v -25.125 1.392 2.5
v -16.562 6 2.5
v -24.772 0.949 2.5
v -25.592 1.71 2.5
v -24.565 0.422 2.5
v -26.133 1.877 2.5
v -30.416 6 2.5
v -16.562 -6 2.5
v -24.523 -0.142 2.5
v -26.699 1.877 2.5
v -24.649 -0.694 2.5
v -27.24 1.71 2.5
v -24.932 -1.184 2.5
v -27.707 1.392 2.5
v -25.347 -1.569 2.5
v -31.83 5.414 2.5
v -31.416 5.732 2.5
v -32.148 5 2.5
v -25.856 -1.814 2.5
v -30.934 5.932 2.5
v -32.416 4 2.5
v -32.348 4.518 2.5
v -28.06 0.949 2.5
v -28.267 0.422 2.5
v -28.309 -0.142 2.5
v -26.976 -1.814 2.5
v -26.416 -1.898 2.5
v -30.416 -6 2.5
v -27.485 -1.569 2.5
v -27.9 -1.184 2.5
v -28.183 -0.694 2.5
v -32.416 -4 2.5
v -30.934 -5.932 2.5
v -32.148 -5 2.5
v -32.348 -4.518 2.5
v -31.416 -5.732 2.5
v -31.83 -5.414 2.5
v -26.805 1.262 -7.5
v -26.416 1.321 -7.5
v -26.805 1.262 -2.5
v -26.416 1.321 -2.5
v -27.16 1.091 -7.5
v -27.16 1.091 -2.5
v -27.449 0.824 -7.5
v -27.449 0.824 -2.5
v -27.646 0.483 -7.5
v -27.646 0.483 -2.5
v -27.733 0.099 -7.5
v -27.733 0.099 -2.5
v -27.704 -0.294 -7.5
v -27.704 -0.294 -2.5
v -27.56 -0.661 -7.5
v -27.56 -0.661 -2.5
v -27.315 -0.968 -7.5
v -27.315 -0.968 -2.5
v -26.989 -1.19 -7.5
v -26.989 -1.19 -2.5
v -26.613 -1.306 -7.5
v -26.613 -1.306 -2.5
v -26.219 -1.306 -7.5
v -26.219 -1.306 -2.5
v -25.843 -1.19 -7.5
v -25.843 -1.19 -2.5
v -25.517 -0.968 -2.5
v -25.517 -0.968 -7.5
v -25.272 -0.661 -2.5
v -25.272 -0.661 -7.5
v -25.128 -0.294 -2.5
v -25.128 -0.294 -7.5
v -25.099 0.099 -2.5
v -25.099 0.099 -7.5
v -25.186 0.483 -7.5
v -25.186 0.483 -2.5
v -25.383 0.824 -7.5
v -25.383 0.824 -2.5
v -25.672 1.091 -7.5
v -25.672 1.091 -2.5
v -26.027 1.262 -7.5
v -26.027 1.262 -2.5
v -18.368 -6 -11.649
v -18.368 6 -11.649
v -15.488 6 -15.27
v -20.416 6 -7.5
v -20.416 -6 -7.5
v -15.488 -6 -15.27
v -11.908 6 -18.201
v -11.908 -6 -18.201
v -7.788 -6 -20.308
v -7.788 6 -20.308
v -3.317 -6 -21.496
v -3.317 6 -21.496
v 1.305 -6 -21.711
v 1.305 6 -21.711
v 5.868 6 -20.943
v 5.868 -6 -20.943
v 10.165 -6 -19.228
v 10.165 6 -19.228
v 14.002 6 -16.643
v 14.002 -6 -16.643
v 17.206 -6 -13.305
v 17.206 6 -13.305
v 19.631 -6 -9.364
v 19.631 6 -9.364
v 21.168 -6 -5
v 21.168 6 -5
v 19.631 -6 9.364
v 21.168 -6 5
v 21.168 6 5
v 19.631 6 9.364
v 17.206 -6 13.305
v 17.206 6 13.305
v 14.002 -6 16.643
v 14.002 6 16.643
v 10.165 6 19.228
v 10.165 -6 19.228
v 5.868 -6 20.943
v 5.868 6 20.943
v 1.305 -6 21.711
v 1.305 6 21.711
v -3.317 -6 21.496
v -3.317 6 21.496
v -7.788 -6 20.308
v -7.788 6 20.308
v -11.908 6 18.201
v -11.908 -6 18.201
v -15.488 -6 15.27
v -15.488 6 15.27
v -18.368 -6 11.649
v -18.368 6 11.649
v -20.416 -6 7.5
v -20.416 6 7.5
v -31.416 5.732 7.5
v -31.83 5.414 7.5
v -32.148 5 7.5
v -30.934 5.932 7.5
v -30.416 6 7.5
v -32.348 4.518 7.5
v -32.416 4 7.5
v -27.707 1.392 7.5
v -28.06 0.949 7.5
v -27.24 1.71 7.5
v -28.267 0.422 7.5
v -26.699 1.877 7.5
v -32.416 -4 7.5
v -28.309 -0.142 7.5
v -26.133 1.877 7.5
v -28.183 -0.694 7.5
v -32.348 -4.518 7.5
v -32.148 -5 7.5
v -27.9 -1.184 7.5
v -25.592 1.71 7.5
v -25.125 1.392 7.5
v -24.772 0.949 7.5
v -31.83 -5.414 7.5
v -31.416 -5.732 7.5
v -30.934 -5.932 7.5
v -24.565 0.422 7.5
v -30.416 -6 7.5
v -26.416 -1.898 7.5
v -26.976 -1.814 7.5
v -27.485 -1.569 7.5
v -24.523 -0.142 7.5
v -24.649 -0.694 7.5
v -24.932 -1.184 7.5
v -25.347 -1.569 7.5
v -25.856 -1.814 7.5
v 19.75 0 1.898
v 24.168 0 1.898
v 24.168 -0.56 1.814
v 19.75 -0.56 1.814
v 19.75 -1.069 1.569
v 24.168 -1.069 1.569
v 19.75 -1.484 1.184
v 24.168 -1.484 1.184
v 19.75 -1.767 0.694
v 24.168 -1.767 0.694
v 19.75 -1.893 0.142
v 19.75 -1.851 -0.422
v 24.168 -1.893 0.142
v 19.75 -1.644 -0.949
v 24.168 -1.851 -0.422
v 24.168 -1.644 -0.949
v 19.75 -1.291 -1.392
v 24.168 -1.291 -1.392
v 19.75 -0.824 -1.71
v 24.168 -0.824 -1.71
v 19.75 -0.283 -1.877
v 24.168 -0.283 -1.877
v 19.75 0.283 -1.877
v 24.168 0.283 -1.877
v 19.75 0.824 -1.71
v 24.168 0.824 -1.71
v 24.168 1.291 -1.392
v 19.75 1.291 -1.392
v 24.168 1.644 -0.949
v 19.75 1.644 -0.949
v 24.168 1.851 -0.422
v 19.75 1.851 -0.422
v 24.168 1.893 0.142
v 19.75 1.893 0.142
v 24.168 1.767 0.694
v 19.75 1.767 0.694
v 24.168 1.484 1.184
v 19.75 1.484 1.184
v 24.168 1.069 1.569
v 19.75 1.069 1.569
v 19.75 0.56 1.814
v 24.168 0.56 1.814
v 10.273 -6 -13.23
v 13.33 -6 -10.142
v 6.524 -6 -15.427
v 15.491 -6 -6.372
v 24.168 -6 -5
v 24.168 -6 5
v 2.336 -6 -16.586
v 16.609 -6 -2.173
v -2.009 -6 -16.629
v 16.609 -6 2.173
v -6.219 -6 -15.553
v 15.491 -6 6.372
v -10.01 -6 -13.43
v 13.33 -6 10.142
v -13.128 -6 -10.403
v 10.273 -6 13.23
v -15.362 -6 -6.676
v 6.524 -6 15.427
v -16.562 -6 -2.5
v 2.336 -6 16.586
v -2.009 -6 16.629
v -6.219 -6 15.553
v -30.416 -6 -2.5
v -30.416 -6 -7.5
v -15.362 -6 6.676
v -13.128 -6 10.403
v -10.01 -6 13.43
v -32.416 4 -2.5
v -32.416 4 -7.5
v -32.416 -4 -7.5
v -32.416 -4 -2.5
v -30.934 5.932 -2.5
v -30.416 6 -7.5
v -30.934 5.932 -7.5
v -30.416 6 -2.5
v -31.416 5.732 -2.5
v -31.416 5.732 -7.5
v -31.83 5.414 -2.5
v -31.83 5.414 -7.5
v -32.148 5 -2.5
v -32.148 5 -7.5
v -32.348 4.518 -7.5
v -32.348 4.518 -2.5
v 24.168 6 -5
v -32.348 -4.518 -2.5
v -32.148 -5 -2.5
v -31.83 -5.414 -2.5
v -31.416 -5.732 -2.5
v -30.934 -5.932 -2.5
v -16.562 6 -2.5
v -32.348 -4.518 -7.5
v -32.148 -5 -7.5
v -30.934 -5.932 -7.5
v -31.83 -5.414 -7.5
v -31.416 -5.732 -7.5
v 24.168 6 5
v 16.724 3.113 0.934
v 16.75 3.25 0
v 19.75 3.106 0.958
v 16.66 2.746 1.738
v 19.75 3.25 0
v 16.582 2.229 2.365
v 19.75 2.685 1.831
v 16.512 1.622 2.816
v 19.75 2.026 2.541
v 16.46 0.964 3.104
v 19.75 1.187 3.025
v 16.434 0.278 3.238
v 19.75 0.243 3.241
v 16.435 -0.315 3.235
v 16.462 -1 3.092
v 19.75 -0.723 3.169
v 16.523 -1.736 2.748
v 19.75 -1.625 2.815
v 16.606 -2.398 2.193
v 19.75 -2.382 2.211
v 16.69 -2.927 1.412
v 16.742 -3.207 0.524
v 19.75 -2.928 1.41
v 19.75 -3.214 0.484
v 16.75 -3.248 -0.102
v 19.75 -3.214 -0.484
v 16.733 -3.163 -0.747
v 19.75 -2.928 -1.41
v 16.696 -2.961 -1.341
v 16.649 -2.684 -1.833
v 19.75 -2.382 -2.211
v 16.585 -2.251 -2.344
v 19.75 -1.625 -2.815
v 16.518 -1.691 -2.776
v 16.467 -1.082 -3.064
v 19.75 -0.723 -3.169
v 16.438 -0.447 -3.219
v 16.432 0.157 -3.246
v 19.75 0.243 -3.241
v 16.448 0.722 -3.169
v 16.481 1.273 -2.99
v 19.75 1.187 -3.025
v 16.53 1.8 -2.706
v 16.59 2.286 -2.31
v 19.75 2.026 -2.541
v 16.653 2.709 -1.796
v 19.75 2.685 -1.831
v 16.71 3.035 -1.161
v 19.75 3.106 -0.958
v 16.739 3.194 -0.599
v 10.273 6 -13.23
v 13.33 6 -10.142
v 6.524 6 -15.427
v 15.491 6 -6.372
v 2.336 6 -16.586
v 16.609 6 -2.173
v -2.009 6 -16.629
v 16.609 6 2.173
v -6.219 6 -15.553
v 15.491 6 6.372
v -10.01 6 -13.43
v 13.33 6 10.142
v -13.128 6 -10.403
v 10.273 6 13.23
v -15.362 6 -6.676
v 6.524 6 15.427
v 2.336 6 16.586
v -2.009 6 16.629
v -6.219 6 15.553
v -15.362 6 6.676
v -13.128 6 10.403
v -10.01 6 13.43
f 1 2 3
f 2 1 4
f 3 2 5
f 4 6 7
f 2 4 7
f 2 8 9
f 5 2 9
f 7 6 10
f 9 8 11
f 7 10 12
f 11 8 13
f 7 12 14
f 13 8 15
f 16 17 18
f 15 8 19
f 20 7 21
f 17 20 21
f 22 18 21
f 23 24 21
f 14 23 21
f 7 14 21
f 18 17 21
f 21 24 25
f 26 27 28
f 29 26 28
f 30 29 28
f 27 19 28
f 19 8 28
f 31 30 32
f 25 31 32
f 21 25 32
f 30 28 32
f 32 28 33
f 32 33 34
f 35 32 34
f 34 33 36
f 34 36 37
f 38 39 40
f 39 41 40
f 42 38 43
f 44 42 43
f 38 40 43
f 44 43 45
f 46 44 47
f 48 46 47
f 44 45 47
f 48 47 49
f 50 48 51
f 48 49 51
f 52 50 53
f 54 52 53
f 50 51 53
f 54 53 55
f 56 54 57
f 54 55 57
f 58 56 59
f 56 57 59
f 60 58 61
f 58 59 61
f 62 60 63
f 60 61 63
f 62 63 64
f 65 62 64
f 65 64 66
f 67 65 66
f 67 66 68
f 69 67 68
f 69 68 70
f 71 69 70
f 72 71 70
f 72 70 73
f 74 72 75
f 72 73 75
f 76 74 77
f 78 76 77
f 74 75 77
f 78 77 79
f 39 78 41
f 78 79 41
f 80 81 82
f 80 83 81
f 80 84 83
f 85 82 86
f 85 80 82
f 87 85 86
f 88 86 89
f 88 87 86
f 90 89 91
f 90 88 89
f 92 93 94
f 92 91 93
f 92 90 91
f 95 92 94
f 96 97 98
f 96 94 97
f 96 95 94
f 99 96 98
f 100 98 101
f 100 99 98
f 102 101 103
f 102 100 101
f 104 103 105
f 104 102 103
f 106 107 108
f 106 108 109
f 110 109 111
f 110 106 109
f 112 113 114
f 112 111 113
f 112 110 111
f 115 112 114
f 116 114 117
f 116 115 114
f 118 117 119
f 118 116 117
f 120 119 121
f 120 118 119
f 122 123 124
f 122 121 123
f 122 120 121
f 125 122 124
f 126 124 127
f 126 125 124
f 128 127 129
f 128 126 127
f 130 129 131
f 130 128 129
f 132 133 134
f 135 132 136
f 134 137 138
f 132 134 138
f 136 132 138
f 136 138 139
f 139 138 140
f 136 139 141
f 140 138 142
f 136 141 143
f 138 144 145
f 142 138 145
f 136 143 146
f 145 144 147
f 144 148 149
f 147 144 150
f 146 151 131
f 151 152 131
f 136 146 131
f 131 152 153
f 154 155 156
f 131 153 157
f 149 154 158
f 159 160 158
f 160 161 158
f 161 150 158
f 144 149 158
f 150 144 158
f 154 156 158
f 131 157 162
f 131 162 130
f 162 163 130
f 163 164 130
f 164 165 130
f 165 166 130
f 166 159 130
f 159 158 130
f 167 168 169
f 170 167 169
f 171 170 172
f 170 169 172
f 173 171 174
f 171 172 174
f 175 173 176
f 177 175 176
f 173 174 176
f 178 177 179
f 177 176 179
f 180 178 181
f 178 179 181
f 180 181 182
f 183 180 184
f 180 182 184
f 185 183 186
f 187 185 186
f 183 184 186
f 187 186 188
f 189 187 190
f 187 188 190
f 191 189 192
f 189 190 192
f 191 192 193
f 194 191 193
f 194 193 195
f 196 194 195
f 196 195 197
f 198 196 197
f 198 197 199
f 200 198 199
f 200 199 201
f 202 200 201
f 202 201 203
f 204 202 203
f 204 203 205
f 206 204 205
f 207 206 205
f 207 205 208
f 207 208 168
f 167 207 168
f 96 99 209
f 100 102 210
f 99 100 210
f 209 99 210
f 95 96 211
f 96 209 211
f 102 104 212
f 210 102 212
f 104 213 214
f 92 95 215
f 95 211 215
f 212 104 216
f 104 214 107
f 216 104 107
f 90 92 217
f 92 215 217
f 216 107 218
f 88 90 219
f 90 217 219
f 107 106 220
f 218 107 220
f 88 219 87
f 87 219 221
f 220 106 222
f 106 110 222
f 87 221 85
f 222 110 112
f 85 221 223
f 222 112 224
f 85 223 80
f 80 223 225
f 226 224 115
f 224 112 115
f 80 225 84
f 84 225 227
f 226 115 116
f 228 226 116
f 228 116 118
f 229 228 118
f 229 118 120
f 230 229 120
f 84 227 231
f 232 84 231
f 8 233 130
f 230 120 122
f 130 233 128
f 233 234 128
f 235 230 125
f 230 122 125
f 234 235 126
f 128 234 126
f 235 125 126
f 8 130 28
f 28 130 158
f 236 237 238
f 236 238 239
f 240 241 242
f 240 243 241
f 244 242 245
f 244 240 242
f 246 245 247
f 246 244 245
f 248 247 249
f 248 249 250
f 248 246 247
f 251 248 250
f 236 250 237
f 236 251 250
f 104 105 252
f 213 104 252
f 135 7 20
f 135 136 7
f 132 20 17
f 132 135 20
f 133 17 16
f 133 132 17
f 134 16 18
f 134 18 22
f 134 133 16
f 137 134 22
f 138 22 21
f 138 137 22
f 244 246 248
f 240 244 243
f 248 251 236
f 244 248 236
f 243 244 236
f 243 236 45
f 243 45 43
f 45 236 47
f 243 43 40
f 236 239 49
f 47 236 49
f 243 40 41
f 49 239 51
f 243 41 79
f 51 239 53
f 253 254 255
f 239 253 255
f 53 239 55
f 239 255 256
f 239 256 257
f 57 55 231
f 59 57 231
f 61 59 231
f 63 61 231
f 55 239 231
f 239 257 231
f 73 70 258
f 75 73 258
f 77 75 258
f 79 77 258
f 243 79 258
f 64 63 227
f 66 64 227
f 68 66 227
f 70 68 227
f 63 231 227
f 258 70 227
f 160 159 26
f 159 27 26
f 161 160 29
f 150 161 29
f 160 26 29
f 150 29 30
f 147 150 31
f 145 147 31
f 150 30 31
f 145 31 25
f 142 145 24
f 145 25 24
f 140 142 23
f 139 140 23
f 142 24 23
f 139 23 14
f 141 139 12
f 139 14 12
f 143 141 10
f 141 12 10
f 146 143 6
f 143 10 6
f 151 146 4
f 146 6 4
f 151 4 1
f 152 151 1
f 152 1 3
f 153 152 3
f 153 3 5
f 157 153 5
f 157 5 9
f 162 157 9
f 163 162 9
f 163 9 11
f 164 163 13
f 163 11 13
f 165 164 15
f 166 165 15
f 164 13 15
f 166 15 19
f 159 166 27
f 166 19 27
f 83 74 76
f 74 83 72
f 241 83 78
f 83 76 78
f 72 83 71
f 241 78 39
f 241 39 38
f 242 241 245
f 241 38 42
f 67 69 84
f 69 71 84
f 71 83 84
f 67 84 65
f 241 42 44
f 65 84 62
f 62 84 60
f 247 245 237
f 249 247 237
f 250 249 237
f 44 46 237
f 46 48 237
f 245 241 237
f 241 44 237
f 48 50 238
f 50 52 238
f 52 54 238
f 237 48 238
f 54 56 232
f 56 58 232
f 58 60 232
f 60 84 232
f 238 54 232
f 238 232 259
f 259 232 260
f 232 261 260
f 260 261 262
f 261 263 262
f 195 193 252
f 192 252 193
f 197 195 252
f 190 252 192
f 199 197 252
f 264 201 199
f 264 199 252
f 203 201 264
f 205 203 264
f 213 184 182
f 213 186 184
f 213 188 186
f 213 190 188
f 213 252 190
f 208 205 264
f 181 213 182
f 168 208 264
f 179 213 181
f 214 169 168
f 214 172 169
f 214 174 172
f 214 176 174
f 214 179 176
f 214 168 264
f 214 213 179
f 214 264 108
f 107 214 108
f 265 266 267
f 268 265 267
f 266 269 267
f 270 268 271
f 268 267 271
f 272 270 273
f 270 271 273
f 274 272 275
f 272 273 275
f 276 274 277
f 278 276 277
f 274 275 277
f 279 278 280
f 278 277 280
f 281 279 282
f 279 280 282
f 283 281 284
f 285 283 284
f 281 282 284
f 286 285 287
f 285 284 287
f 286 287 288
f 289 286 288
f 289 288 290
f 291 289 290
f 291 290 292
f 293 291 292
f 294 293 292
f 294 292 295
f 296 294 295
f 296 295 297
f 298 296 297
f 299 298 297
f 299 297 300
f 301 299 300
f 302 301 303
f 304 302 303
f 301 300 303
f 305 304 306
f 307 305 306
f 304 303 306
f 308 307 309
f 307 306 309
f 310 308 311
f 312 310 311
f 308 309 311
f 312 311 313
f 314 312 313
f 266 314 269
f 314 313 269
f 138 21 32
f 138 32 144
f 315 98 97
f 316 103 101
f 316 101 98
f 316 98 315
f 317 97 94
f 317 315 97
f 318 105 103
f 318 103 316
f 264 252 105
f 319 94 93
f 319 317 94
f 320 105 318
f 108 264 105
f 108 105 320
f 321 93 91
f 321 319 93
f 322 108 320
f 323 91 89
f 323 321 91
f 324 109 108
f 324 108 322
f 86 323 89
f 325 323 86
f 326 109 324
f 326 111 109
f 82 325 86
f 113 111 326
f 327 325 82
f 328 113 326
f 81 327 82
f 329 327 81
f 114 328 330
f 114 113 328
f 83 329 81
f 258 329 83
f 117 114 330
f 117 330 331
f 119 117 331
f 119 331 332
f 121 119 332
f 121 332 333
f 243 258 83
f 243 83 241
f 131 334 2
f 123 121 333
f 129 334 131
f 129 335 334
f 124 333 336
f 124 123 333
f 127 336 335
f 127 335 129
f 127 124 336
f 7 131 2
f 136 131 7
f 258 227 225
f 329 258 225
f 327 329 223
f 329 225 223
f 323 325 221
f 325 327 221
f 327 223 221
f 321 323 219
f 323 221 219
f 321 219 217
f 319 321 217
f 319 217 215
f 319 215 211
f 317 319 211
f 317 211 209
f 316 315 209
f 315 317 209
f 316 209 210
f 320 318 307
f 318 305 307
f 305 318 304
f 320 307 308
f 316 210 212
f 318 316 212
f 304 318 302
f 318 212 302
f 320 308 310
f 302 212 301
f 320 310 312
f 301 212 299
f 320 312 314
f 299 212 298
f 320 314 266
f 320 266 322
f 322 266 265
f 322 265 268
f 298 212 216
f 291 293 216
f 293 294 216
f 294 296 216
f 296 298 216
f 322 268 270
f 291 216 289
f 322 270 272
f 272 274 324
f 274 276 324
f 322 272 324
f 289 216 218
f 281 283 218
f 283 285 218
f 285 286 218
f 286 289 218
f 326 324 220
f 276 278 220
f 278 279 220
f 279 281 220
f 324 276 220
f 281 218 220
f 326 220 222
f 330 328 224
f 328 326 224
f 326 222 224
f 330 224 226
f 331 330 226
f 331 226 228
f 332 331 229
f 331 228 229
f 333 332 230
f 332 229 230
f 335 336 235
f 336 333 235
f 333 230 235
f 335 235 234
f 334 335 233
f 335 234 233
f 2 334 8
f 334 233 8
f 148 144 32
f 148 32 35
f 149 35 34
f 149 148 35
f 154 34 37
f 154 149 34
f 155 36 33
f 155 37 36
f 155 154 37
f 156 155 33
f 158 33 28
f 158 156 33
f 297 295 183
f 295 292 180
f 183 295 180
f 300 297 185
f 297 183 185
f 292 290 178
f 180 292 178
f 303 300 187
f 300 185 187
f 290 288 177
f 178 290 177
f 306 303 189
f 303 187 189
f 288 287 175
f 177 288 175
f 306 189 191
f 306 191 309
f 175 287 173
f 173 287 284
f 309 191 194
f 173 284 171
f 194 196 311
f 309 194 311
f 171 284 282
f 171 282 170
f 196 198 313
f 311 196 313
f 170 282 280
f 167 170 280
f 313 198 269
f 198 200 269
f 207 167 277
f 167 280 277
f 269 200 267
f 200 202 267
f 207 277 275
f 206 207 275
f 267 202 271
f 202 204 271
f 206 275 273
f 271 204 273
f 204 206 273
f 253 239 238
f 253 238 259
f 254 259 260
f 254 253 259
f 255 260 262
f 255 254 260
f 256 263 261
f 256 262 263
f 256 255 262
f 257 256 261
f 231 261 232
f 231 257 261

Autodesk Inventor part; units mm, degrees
ref_plane "XZ Plane" through (0, 0, 0) normal (0, 1, 0) x (-1, 0, 0)
ref_plane "XY Plane" through (0, 0, 0) normal (0, 0, 1) x (1, 0, 0)
sketch "Sketch1" plane through (0, 0, 0) normal (0, 1, 0) x (-1, 0, 0)
  arc A0 (16.5624, 2.5) -> (16.5624, -2.5) centre (0, 0) ccw
  arc A1 (20.416, 7.5) -> (20.416, -7.5) centre (0, 0) ccw
  line L0 (32.416, 7.5) -> (20.416, 7.5)
  line L1 (16.5624, 2.5) -> (32.416, 2.5)
  line L2 (32.416, 2.5) -> (32.416, 7.5)
  line L3 (32.416, -2.5) -> (16.5624, -2.5)
  line L4 (20.416, -7.5) -> (32.416, -7.5)
  line L5 (32.416, -7.5) -> (32.416, -2.5)
  line L6 (26.416, 5) -> (26.416, -5) construction
  line L7 (-21.1675, -5) -> (-24.1675, -5)
  line L8 (-24.1675, -5) -> (-24.1675, 5)
  line L9 (-24.1675, 5) -> (-21.1675, 5)
  line L10 (-21.1675, 5) -> (-21.1675, -5)
  point P0 (32.416, 5)
  point P1 (32.416, -5)
  point P2 (26.416, 0)
  point P3 (26.416, -7.5)
  point P4 (-16.75, 0)
  point P5 (-24.1675, 0)
  dimension "d0" = 33.5
  dimension "d1" = 5
  dimension "d4" = 5
  dimension "d5" = 5
  dimension "d6" = 10
  dimension "d7" = 12
  dimension "d35" = 10
  dimension "d36" = 3
extrude "Extrusion1" add sketch "Sketch1" along normal mid plane 12
sketch "Sketch2" plane through (-32.416, 6, 7.5) normal (0, 0, 1) x (1, 0, 0)
  line L0 (0, 0) -> (0, -12) projected
  line L1 (0, 0) -> (12, 0) projected
  point P0 (32.416, -6)
  point P1 (6, -6)
  point P2 (0, -6)
  point P3 (6, 0)
hole "Hole1" at (-26.416, 0, 7.5) direction (0, 0, -1) diameter 3.797 depth 5 clearance for "Flat Head Machine Screw (82)" size "#6" standard "Ansi Unified Screw Threads"
sketch "Sketch3" plane through (-20.416, 6, -7.5) normal (0, 0, -1) x (-1, 0, 0)
  line L0 (8.3161, -1.9884) -> (10.6322, -6)
  line L1 (10.6322, -6) -> (8.3161, -10.0116)
  line L2 (8.3161, -10.0116) -> (3.6839, -10.0116)
  line L3 (3.6839, -10.0116) -> (1.3678, -6)
  line L4 (1.3678, -6) -> (3.6839, -1.9884)
  line L5 (3.6839, -1.9884) -> (8.3161, -1.9884)
  circle A0 centre (6, -6) radius 1.8985 projected
  point P0 (-20.416, -6)
  dimension "d17" = 8.0232
extrude "Extrusion2" [suppressed]
fillet "Fillet1" radius 2 4 edges at (-32.416, -6, -5) (-32.416, 6, -5) (-32.416, 6, 5) (-32.416, -6, 5)
ref_plane "Work Plane3" through (19.75, 0, 0) normal (1, 0, 0) x (0, 1, 0)
sketch "Sketch5" plane through (19.75, 0, 0) normal (1, 0, 0) x (0, 1, 0)
  circle A0 centre (0, 0) radius 3.25
  dimension "d25" = 6.5
extrude "Extrusion4" cut sketch "Sketch5" against normal up to next
hole "Hole2" at (19.75, 0, 0) direction (1, 0, 0) diameter 3.797 end through all clearance for "Flat Head Machine Screw (82)" size "#6" standard "Ansi Unified Screw Threads"
sketch "Sketch6" plane through (-20.416, -6, -7.5) normal (0, 0, -1) x (-1, 0, 0)
  line L0 (10, 0) -> (-3.8536, 0) projected
  point P0 (-20.416, 6)
  point P1 (6, 6)
hole "Hole3" at (-26.416, 0, -7.5) direction (0, 0, 1) diameter 2.642 depth 5 thread size "6-32 UNC" class "2B" standard "ANSI Unified Screw Threads"
equation "\"d5\" = d4"
properties part number "CameraClamp"
